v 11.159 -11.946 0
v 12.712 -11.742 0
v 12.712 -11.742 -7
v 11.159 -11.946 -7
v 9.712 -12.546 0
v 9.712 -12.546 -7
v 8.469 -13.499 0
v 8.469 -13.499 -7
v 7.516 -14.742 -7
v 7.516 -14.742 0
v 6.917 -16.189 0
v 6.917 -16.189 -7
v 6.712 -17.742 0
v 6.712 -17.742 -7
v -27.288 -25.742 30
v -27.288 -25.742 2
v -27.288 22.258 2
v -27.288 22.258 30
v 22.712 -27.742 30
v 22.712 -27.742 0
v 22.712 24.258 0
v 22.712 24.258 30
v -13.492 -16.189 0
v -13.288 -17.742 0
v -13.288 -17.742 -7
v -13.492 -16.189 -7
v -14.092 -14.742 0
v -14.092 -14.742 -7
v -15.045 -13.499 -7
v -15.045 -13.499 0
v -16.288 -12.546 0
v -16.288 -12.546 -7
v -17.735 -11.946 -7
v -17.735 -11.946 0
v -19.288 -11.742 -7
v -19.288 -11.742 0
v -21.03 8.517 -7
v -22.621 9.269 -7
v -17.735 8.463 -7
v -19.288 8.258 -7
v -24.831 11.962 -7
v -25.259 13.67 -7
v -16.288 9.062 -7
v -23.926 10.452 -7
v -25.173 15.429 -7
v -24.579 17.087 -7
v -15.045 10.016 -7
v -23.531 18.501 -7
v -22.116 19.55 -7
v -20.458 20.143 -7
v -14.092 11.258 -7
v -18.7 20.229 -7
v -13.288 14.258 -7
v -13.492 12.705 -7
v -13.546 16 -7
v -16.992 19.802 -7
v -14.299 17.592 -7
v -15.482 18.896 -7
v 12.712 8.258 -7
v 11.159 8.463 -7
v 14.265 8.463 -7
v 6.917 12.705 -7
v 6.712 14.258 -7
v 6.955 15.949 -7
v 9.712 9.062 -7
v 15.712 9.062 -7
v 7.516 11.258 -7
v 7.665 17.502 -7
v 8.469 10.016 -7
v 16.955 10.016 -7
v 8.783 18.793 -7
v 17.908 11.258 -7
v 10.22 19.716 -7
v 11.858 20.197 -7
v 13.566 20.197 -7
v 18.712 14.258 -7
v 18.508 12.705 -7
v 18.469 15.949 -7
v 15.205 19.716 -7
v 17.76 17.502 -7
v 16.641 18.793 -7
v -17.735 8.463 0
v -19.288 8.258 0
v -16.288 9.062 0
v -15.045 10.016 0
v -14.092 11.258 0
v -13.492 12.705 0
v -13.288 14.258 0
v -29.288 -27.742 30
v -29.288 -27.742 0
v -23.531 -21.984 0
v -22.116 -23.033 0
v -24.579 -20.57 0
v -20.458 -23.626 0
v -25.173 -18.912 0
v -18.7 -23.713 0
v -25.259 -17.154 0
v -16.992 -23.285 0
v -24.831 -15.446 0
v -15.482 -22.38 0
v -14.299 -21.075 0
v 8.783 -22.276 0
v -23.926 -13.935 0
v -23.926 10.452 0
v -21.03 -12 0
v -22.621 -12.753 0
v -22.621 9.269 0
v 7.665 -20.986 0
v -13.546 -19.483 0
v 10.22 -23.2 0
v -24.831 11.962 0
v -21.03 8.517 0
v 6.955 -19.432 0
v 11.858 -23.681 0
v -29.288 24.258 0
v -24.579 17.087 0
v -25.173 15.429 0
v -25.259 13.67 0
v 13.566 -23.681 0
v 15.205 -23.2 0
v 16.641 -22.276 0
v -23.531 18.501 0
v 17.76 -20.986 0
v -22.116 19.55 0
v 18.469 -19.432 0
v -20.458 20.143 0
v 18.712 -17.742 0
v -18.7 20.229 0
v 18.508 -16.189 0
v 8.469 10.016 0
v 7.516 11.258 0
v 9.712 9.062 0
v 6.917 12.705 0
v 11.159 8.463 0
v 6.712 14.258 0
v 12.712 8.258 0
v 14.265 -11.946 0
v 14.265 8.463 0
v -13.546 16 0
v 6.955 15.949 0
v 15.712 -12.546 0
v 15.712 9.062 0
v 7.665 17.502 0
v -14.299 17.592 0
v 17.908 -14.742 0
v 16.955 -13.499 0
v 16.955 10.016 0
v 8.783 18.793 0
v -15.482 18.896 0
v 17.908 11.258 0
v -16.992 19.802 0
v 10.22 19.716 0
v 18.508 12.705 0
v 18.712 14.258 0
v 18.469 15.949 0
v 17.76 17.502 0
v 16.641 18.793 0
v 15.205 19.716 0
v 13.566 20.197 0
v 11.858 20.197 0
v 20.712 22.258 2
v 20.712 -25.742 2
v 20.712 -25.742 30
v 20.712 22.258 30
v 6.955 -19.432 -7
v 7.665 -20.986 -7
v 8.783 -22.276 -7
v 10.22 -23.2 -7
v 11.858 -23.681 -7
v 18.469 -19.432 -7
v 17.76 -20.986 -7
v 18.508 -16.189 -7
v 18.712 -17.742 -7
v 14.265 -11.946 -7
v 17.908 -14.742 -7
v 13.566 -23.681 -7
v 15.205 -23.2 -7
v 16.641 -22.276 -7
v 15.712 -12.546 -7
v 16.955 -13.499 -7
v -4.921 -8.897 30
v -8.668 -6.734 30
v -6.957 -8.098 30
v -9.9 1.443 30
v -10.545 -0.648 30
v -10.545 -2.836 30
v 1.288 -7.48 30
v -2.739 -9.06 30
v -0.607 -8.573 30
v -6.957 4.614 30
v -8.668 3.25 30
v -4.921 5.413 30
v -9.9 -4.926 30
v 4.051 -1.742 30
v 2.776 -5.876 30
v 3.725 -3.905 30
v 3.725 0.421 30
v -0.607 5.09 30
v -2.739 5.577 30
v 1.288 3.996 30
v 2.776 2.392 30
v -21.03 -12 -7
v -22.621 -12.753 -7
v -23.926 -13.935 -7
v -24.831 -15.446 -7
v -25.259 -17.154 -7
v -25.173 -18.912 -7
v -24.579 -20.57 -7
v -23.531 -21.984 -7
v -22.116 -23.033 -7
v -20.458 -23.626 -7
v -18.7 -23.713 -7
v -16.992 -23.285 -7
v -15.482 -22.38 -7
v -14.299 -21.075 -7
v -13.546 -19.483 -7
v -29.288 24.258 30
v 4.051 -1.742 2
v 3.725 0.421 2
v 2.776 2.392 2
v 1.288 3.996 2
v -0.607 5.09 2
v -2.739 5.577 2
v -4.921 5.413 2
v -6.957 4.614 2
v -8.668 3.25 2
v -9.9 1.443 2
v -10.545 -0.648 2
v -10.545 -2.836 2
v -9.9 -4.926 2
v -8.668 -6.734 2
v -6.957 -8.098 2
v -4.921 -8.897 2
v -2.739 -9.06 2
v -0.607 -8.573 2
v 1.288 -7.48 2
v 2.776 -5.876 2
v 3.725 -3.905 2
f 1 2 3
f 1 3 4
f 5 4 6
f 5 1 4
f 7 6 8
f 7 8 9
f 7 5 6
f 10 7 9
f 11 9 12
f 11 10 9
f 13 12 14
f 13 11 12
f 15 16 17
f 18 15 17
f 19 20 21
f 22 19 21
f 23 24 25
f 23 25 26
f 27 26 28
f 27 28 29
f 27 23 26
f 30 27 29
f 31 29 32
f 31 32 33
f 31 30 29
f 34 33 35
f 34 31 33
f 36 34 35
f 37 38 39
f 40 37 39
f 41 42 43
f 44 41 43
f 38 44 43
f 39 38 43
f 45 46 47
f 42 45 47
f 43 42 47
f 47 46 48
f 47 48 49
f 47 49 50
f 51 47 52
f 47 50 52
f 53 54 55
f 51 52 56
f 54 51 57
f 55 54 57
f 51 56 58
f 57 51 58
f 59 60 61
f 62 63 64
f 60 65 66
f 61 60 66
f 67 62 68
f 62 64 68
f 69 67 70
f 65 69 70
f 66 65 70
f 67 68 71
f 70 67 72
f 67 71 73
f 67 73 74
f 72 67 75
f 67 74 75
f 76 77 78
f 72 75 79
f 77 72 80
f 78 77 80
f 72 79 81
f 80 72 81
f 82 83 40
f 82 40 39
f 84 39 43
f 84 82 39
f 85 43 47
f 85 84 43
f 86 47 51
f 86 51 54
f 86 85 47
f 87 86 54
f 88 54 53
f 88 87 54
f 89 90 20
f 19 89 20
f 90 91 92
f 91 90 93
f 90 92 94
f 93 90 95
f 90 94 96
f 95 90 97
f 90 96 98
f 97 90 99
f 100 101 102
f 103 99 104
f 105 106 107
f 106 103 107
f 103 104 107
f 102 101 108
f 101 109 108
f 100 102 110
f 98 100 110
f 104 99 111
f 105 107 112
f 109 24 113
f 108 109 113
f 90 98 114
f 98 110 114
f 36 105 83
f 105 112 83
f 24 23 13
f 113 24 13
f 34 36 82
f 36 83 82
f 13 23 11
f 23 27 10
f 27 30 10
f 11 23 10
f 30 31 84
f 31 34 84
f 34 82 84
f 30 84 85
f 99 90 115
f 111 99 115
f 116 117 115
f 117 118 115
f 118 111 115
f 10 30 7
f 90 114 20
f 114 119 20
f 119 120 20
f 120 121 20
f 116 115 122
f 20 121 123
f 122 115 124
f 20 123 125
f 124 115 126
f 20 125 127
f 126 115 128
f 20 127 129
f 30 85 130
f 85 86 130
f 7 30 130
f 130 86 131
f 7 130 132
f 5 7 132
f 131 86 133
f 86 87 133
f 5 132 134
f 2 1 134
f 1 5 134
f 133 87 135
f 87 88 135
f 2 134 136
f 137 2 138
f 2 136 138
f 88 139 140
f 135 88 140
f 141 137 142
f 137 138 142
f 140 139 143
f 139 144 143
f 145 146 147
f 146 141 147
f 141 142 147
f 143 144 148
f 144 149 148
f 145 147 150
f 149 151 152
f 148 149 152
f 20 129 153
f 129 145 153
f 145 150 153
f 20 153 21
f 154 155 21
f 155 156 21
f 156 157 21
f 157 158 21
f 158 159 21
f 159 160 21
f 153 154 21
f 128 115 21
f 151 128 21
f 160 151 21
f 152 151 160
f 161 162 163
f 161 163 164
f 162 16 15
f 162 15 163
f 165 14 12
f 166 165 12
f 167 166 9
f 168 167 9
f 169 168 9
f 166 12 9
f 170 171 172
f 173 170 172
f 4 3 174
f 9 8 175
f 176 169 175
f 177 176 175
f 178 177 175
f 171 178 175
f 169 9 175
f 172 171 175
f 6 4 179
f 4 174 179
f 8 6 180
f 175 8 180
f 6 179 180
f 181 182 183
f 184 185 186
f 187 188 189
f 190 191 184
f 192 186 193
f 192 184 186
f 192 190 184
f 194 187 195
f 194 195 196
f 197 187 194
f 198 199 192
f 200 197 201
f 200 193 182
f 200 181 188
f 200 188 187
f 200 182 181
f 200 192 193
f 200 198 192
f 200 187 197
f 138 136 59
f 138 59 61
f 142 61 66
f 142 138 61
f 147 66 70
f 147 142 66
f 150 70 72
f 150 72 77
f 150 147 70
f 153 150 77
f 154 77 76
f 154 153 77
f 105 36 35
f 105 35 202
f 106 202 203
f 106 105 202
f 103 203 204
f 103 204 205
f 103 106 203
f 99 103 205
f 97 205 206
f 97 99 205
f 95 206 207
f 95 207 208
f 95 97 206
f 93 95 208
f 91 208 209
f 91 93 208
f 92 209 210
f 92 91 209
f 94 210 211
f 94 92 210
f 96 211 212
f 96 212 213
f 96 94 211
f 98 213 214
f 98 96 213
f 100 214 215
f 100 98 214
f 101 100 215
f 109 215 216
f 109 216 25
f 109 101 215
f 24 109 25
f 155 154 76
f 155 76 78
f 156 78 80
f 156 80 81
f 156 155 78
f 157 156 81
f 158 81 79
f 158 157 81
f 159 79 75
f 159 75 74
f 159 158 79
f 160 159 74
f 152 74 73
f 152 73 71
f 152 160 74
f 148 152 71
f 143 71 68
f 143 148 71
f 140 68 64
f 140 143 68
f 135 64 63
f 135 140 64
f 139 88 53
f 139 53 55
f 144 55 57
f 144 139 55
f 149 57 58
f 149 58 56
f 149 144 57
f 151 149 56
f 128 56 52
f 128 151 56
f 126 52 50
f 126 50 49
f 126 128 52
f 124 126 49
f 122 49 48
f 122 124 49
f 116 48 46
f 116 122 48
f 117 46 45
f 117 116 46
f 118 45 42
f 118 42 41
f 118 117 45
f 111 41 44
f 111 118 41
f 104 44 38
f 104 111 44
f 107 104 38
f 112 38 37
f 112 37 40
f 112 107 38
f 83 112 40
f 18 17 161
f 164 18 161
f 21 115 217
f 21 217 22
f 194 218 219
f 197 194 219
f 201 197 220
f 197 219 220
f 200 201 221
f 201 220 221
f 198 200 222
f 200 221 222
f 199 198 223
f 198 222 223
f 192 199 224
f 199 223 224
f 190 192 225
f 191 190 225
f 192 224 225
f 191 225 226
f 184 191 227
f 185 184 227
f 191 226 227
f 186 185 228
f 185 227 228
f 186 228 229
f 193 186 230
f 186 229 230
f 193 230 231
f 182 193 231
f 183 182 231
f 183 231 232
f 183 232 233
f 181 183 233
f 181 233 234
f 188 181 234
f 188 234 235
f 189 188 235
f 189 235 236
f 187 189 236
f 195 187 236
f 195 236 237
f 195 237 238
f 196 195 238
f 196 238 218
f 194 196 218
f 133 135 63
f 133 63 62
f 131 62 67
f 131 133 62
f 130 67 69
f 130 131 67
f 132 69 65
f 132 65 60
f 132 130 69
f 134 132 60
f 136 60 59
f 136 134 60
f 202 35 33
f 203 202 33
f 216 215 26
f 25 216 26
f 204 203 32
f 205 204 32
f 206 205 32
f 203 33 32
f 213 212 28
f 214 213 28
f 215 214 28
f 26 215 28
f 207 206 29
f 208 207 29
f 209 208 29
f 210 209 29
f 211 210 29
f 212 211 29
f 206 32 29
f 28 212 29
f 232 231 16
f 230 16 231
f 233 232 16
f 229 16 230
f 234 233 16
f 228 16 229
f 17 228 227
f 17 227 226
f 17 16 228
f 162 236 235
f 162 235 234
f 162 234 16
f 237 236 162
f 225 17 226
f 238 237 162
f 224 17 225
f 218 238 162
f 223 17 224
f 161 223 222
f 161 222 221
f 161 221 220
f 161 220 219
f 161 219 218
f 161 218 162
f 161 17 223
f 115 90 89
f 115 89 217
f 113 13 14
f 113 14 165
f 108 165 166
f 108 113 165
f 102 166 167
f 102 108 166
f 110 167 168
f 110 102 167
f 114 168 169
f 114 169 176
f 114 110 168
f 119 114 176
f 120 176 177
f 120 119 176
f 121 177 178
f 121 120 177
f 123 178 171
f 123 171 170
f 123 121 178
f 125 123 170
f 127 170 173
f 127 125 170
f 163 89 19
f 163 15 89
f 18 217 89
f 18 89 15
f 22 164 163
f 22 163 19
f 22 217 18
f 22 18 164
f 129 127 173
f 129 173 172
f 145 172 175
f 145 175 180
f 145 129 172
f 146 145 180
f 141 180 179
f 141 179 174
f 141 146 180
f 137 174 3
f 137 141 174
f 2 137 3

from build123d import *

# Parameters (mm, degrees)
F0_W     = 52
F0_H     = 52
F0_W_2   = 48
F0_H_2   = 48
F1_DEPTH = 30
F0_R     = 7.3390667627
F2_DEPTH = 7
F3_DEPTH = 2


with BuildPart() as f1:
    # F0 (on Top) → F1 (new body)
    with BuildSketch(Plane.XY):
        with Locations((-3.2878808908, -1.7417492345)):
            Rectangle(F0_W, F0_H)
        with Locations((-3.2878808908, -1.7417492345)):
            Rectangle(F0_W_2, F0_H_2, mode=Mode.SUBTRACT)
    extrude(amount=F1_DEPTH)



with BuildPart() as f1b:
    # F0 (on Top) → F1, piece 2 (new body)
    with BuildSketch(Plane.XY):
        with Locations((-3.2878808908, -1.7417492345)):
            Circle(F0_R)
    extrude(amount=F1_DEPTH)


with BuildPart() as f2:
    # F0 (on Top) → F2 (new body)
    with BuildSketch(Plane.XY):
        with BuildLine():
            ThreePointArc((18.7121191092, 14.2582507655), (12.7121191092, 20.2582507655), (6.7121191092, 14.2582507655))
            Line((6.7121191092, 14.2582507655), (12.7121191092, 14.2582507655))
            Line((12.7121191092, 14.2582507655), (12.7121191092, 8.2582507655))
            ThreePointArc((12.7121191092, 8.2582507655), (16.9547597963, 10.0156100784), (18.7121191092, 14.2582507655))
        make_face()
        with BuildLine():
            Line((12.7121191092, 14.2582507655), (6.7121191092, 14.2582507655))
            ThreePointArc((6.7121191092, 14.2582507655), (8.4694784221, 10.0156100784), (12.7121191092, 8.2582507655))
            Line((12.7121191092, 8.2582507655), (12.7121191092, 14.2582507655))
        make_face()
    extrude(amount=-F2_DEPTH)


with BuildPart() as f2b:
    # F0 (on Top) → F2, piece 2 (new body)
    with BuildSketch(Plane.XY):
        with BuildLine():
            Line((-19.2878808908, 14.2582507655), (-13.2878808908, 14.2582507655))
            ThreePointArc((-13.2878808908, 14.2582507655), (-23.5305215779, 18.5008914526), (-19.2878808908, 8.2582507655))
            Line((-19.2878808908, 8.2582507655), (-19.2878808908, 14.2582507655))
        make_face()
        with BuildLine():
            ThreePointArc((-19.2878808908, 8.2582507655), (-15.0452402037, 10.0156100784), (-13.2878808908, 14.2582507655))
            Line((-13.2878808908, 14.2582507655), (-19.2878808908, 14.2582507655))
            Line((-19.2878808908, 14.2582507655), (-19.2878808908, 8.2582507655))
        make_face()
    extrude(amount=-F2_DEPTH)


with BuildPart() as f2c:
    # F0 (on Top) → F2, piece 3 (new body)
    with BuildSketch(Plane.XY):
        with BuildLine():
            ThreePointArc((18.7121191092, -17.7417492345), (16.9547597963, -13.4991085474), (12.7121191092, -11.7417492345))
            Line((12.7121191092, -11.7417492345), (12.7121191092, -17.7417492345))
            Line((12.7121191092, -17.7417492345), (6.7121191092, -17.7417492345))
            ThreePointArc((6.7121191092, -17.7417492345), (12.7121191092, -23.7417492345), (18.7121191092, -17.7417492345))
        make_face()
        with BuildLine():
            Line((12.7121191092, -17.7417492345), (12.7121191092, -11.7417492345))
            ThreePointArc((12.7121191092, -11.7417492345), (8.4694784221, -13.4991085474), (6.7121191092, -17.7417492345))
            Line((6.7121191092, -17.7417492345), (12.7121191092, -17.7417492345))
        make_face()
    extrude(amount=-F2_DEPTH)


with BuildPart() as f2d:
    # F0 (on Top) → F2, piece 4 (new body)
    with BuildSketch(Plane.XY):
        with BuildLine():
            ThreePointArc((-13.2878808908, -17.7417492345), (-15.0452402037, -13.4991085474), (-19.2878808908, -11.7417492345))
            Line((-19.2878808908, -11.7417492345), (-19.2878808908, -17.7417492345))
            Line((-19.2878808908, -17.7417492345), (-13.2878808908, -17.7417492345))
        make_face()
        with BuildLine():
            Line((-19.2878808908, -17.7417492345), (-19.2878808908, -11.7417492345))
            ThreePointArc((-19.2878808908, -11.7417492345), (-23.5305215779, -21.9843899216), (-13.2878808908, -17.7417492345))
            Line((-13.2878808908, -17.7417492345), (-19.2878808908, -17.7417492345))
        make_face()
    extrude(amount=-F2_DEPTH)


with BuildPart() as f1_1:
    add(f1.part)

    add(f1b.part)  # F3 merges F1b

    add(f2.part)  # F3 merges F2

    add(f2b.part)  # F3 merges F2b

    add(f2c.part)  # F3 merges F2c

    add(f2d.part)  # F3 merges F2d
    # F0 (on Top) → F3 (join)
    with BuildSketch(Plane.XY):
        with Locations((-3.2878808908, -1.7417492345)):
            Rectangle(F0_W_2, F0_H_2)
        with BuildLine():
            ThreePointArc((-19.2878808908, 8.2582507655), (-23.5305215779, 18.5008914526), (-13.2878808908, 14.2582507655))
            Line((-13.2878808908, 14.2582507655), (6.7121191092, 14.2582507655))
            ThreePointArc((6.7121191092, 14.2582507655), (12.7121191092, 20.2582507655), (18.7121191092, 14.2582507655))
            ThreePointArc((18.7121191092, 14.2582507655), (16.9547597963, 10.0156100784), (12.7121191092, 8.2582507655))
            Line((12.7121191092, 8.2582507655), (12.7121191092, -11.7417492345))
            ThreePointArc((12.7121191092, -11.7417492345), (16.9547597963, -13.4991085474), (18.7121191092, -17.7417492345))
            ThreePointArc((18.7121191092, -17.7417492345), (12.7121191092, -23.7417492345), (6.7121191092, -17.7417492345))
            Line((6.7121191092, -17.7417492345), (-13.2878808908, -17.7417492345))
            ThreePointArc((-13.2878808908, -17.7417492345), (-23.5305215779, -21.9843899216), (-19.2878808908, -11.7417492345))
            Line((-19.2878808908, -11.7417492345), (-19.2878808908, 8.2582507655))
        make_face(mode=Mode.SUBTRACT)
        with BuildLine():
            ThreePointArc((-13.2878808908, -17.7417492345), (-15.0452402037, -13.4991085474), (-19.2878808908, -11.7417492345))
            Line((-19.2878808908, -11.7417492345), (-19.2878808908, -17.7417492345))
            Line((-19.2878808908, -17.7417492345), (-13.2878808908, -17.7417492345))
        make_face()
        with BuildLine():
            Line((-19.2878808908, -17.7417492345), (-19.2878808908, -11.7417492345))
            ThreePointArc((-19.2878808908, -11.7417492345), (-23.5305215779, -21.9843899216), (-13.2878808908, -17.7417492345))
            Line((-13.2878808908, -17.7417492345), (-19.2878808908, -17.7417492345))
        make_face()
        with BuildLine():
            Line((6.7121191092, 14.2582507655), (-13.2878808908, 14.2582507655))
            ThreePointArc((-13.2878808908, 14.2582507655), (-15.0452402037, 10.0156100784), (-19.2878808908, 8.2582507655))
            Line((-19.2878808908, 8.2582507655), (-19.2878808908, -11.7417492345))
            ThreePointArc((-19.2878808908, -11.7417492345), (-15.0452402037, -13.4991085474), (-13.2878808908, -17.7417492345))
            Line((-13.2878808908, -17.7417492345), (6.7121191092, -17.7417492345))
            ThreePointArc((6.7121191092, -17.7417492345), (8.4694784221, -13.4991085474), (12.7121191092, -11.7417492345))
            Line((12.7121191092, -11.7417492345), (12.7121191092, 8.2582507655))
            ThreePointArc((12.7121191092, 8.2582507655), (8.4694784221, 10.0156100784), (6.7121191092, 14.2582507655))
        make_face()
        with Locations((-3.2878808908, -1.7417492345)):
            Circle(F0_R, mode=Mode.SUBTRACT)
        with BuildLine():
            Line((-19.2878808908, 14.2582507655), (-13.2878808908, 14.2582507655))
            ThreePointArc((-13.2878808908, 14.2582507655), (-23.5305215779, 18.5008914526), (-19.2878808908, 8.2582507655))
            Line((-19.2878808908, 8.2582507655), (-19.2878808908, 14.2582507655))
        make_face()
        with BuildLine():
            ThreePointArc((-19.2878808908, 8.2582507655), (-15.0452402037, 10.0156100784), (-13.2878808908, 14.2582507655))
            Line((-13.2878808908, 14.2582507655), (-19.2878808908, 14.2582507655))
            Line((-19.2878808908, 14.2582507655), (-19.2878808908, 8.2582507655))
        make_face()
        with BuildLine():
            ThreePointArc((18.7121191092, 14.2582507655), (12.7121191092, 20.2582507655), (6.7121191092, 14.2582507655))
            Line((6.7121191092, 14.2582507655), (12.7121191092, 14.2582507655))
            Line((12.7121191092, 14.2582507655), (12.7121191092, 8.2582507655))
            ThreePointArc((12.7121191092, 8.2582507655), (16.9547597963, 10.0156100784), (18.7121191092, 14.2582507655))
        make_face()
        with BuildLine():
            Line((12.7121191092, 14.2582507655), (6.7121191092, 14.2582507655))
            ThreePointArc((6.7121191092, 14.2582507655), (8.4694784221, 10.0156100784), (12.7121191092, 8.2582507655))
            Line((12.7121191092, 8.2582507655), (12.7121191092, 14.2582507655))
        make_face()
        with BuildLine():
            Line((12.7121191092, -17.7417492345), (12.7121191092, -11.7417492345))
            ThreePointArc((12.7121191092, -11.7417492345), (8.4694784221, -13.4991085474), (6.7121191092, -17.7417492345))
            Line((6.7121191092, -17.7417492345), (12.7121191092, -17.7417492345))
        make_face()
        with BuildLine():
            ThreePointArc((18.7121191092, -17.7417492345), (16.9547597963, -13.4991085474), (12.7121191092, -11.7417492345))
            Line((12.7121191092, -11.7417492345), (12.7121191092, -17.7417492345))
            Line((12.7121191092, -17.7417492345), (6.7121191092, -17.7417492345))
            ThreePointArc((6.7121191092, -17.7417492345), (12.7121191092, -23.7417492345), (18.7121191092, -17.7417492345))
        make_face()
        with Locations((-3.2878808908, -1.7417492345)):
            Circle(F0_R)
    extrude(amount=F3_DEPTH)


solid = f1_1.part
